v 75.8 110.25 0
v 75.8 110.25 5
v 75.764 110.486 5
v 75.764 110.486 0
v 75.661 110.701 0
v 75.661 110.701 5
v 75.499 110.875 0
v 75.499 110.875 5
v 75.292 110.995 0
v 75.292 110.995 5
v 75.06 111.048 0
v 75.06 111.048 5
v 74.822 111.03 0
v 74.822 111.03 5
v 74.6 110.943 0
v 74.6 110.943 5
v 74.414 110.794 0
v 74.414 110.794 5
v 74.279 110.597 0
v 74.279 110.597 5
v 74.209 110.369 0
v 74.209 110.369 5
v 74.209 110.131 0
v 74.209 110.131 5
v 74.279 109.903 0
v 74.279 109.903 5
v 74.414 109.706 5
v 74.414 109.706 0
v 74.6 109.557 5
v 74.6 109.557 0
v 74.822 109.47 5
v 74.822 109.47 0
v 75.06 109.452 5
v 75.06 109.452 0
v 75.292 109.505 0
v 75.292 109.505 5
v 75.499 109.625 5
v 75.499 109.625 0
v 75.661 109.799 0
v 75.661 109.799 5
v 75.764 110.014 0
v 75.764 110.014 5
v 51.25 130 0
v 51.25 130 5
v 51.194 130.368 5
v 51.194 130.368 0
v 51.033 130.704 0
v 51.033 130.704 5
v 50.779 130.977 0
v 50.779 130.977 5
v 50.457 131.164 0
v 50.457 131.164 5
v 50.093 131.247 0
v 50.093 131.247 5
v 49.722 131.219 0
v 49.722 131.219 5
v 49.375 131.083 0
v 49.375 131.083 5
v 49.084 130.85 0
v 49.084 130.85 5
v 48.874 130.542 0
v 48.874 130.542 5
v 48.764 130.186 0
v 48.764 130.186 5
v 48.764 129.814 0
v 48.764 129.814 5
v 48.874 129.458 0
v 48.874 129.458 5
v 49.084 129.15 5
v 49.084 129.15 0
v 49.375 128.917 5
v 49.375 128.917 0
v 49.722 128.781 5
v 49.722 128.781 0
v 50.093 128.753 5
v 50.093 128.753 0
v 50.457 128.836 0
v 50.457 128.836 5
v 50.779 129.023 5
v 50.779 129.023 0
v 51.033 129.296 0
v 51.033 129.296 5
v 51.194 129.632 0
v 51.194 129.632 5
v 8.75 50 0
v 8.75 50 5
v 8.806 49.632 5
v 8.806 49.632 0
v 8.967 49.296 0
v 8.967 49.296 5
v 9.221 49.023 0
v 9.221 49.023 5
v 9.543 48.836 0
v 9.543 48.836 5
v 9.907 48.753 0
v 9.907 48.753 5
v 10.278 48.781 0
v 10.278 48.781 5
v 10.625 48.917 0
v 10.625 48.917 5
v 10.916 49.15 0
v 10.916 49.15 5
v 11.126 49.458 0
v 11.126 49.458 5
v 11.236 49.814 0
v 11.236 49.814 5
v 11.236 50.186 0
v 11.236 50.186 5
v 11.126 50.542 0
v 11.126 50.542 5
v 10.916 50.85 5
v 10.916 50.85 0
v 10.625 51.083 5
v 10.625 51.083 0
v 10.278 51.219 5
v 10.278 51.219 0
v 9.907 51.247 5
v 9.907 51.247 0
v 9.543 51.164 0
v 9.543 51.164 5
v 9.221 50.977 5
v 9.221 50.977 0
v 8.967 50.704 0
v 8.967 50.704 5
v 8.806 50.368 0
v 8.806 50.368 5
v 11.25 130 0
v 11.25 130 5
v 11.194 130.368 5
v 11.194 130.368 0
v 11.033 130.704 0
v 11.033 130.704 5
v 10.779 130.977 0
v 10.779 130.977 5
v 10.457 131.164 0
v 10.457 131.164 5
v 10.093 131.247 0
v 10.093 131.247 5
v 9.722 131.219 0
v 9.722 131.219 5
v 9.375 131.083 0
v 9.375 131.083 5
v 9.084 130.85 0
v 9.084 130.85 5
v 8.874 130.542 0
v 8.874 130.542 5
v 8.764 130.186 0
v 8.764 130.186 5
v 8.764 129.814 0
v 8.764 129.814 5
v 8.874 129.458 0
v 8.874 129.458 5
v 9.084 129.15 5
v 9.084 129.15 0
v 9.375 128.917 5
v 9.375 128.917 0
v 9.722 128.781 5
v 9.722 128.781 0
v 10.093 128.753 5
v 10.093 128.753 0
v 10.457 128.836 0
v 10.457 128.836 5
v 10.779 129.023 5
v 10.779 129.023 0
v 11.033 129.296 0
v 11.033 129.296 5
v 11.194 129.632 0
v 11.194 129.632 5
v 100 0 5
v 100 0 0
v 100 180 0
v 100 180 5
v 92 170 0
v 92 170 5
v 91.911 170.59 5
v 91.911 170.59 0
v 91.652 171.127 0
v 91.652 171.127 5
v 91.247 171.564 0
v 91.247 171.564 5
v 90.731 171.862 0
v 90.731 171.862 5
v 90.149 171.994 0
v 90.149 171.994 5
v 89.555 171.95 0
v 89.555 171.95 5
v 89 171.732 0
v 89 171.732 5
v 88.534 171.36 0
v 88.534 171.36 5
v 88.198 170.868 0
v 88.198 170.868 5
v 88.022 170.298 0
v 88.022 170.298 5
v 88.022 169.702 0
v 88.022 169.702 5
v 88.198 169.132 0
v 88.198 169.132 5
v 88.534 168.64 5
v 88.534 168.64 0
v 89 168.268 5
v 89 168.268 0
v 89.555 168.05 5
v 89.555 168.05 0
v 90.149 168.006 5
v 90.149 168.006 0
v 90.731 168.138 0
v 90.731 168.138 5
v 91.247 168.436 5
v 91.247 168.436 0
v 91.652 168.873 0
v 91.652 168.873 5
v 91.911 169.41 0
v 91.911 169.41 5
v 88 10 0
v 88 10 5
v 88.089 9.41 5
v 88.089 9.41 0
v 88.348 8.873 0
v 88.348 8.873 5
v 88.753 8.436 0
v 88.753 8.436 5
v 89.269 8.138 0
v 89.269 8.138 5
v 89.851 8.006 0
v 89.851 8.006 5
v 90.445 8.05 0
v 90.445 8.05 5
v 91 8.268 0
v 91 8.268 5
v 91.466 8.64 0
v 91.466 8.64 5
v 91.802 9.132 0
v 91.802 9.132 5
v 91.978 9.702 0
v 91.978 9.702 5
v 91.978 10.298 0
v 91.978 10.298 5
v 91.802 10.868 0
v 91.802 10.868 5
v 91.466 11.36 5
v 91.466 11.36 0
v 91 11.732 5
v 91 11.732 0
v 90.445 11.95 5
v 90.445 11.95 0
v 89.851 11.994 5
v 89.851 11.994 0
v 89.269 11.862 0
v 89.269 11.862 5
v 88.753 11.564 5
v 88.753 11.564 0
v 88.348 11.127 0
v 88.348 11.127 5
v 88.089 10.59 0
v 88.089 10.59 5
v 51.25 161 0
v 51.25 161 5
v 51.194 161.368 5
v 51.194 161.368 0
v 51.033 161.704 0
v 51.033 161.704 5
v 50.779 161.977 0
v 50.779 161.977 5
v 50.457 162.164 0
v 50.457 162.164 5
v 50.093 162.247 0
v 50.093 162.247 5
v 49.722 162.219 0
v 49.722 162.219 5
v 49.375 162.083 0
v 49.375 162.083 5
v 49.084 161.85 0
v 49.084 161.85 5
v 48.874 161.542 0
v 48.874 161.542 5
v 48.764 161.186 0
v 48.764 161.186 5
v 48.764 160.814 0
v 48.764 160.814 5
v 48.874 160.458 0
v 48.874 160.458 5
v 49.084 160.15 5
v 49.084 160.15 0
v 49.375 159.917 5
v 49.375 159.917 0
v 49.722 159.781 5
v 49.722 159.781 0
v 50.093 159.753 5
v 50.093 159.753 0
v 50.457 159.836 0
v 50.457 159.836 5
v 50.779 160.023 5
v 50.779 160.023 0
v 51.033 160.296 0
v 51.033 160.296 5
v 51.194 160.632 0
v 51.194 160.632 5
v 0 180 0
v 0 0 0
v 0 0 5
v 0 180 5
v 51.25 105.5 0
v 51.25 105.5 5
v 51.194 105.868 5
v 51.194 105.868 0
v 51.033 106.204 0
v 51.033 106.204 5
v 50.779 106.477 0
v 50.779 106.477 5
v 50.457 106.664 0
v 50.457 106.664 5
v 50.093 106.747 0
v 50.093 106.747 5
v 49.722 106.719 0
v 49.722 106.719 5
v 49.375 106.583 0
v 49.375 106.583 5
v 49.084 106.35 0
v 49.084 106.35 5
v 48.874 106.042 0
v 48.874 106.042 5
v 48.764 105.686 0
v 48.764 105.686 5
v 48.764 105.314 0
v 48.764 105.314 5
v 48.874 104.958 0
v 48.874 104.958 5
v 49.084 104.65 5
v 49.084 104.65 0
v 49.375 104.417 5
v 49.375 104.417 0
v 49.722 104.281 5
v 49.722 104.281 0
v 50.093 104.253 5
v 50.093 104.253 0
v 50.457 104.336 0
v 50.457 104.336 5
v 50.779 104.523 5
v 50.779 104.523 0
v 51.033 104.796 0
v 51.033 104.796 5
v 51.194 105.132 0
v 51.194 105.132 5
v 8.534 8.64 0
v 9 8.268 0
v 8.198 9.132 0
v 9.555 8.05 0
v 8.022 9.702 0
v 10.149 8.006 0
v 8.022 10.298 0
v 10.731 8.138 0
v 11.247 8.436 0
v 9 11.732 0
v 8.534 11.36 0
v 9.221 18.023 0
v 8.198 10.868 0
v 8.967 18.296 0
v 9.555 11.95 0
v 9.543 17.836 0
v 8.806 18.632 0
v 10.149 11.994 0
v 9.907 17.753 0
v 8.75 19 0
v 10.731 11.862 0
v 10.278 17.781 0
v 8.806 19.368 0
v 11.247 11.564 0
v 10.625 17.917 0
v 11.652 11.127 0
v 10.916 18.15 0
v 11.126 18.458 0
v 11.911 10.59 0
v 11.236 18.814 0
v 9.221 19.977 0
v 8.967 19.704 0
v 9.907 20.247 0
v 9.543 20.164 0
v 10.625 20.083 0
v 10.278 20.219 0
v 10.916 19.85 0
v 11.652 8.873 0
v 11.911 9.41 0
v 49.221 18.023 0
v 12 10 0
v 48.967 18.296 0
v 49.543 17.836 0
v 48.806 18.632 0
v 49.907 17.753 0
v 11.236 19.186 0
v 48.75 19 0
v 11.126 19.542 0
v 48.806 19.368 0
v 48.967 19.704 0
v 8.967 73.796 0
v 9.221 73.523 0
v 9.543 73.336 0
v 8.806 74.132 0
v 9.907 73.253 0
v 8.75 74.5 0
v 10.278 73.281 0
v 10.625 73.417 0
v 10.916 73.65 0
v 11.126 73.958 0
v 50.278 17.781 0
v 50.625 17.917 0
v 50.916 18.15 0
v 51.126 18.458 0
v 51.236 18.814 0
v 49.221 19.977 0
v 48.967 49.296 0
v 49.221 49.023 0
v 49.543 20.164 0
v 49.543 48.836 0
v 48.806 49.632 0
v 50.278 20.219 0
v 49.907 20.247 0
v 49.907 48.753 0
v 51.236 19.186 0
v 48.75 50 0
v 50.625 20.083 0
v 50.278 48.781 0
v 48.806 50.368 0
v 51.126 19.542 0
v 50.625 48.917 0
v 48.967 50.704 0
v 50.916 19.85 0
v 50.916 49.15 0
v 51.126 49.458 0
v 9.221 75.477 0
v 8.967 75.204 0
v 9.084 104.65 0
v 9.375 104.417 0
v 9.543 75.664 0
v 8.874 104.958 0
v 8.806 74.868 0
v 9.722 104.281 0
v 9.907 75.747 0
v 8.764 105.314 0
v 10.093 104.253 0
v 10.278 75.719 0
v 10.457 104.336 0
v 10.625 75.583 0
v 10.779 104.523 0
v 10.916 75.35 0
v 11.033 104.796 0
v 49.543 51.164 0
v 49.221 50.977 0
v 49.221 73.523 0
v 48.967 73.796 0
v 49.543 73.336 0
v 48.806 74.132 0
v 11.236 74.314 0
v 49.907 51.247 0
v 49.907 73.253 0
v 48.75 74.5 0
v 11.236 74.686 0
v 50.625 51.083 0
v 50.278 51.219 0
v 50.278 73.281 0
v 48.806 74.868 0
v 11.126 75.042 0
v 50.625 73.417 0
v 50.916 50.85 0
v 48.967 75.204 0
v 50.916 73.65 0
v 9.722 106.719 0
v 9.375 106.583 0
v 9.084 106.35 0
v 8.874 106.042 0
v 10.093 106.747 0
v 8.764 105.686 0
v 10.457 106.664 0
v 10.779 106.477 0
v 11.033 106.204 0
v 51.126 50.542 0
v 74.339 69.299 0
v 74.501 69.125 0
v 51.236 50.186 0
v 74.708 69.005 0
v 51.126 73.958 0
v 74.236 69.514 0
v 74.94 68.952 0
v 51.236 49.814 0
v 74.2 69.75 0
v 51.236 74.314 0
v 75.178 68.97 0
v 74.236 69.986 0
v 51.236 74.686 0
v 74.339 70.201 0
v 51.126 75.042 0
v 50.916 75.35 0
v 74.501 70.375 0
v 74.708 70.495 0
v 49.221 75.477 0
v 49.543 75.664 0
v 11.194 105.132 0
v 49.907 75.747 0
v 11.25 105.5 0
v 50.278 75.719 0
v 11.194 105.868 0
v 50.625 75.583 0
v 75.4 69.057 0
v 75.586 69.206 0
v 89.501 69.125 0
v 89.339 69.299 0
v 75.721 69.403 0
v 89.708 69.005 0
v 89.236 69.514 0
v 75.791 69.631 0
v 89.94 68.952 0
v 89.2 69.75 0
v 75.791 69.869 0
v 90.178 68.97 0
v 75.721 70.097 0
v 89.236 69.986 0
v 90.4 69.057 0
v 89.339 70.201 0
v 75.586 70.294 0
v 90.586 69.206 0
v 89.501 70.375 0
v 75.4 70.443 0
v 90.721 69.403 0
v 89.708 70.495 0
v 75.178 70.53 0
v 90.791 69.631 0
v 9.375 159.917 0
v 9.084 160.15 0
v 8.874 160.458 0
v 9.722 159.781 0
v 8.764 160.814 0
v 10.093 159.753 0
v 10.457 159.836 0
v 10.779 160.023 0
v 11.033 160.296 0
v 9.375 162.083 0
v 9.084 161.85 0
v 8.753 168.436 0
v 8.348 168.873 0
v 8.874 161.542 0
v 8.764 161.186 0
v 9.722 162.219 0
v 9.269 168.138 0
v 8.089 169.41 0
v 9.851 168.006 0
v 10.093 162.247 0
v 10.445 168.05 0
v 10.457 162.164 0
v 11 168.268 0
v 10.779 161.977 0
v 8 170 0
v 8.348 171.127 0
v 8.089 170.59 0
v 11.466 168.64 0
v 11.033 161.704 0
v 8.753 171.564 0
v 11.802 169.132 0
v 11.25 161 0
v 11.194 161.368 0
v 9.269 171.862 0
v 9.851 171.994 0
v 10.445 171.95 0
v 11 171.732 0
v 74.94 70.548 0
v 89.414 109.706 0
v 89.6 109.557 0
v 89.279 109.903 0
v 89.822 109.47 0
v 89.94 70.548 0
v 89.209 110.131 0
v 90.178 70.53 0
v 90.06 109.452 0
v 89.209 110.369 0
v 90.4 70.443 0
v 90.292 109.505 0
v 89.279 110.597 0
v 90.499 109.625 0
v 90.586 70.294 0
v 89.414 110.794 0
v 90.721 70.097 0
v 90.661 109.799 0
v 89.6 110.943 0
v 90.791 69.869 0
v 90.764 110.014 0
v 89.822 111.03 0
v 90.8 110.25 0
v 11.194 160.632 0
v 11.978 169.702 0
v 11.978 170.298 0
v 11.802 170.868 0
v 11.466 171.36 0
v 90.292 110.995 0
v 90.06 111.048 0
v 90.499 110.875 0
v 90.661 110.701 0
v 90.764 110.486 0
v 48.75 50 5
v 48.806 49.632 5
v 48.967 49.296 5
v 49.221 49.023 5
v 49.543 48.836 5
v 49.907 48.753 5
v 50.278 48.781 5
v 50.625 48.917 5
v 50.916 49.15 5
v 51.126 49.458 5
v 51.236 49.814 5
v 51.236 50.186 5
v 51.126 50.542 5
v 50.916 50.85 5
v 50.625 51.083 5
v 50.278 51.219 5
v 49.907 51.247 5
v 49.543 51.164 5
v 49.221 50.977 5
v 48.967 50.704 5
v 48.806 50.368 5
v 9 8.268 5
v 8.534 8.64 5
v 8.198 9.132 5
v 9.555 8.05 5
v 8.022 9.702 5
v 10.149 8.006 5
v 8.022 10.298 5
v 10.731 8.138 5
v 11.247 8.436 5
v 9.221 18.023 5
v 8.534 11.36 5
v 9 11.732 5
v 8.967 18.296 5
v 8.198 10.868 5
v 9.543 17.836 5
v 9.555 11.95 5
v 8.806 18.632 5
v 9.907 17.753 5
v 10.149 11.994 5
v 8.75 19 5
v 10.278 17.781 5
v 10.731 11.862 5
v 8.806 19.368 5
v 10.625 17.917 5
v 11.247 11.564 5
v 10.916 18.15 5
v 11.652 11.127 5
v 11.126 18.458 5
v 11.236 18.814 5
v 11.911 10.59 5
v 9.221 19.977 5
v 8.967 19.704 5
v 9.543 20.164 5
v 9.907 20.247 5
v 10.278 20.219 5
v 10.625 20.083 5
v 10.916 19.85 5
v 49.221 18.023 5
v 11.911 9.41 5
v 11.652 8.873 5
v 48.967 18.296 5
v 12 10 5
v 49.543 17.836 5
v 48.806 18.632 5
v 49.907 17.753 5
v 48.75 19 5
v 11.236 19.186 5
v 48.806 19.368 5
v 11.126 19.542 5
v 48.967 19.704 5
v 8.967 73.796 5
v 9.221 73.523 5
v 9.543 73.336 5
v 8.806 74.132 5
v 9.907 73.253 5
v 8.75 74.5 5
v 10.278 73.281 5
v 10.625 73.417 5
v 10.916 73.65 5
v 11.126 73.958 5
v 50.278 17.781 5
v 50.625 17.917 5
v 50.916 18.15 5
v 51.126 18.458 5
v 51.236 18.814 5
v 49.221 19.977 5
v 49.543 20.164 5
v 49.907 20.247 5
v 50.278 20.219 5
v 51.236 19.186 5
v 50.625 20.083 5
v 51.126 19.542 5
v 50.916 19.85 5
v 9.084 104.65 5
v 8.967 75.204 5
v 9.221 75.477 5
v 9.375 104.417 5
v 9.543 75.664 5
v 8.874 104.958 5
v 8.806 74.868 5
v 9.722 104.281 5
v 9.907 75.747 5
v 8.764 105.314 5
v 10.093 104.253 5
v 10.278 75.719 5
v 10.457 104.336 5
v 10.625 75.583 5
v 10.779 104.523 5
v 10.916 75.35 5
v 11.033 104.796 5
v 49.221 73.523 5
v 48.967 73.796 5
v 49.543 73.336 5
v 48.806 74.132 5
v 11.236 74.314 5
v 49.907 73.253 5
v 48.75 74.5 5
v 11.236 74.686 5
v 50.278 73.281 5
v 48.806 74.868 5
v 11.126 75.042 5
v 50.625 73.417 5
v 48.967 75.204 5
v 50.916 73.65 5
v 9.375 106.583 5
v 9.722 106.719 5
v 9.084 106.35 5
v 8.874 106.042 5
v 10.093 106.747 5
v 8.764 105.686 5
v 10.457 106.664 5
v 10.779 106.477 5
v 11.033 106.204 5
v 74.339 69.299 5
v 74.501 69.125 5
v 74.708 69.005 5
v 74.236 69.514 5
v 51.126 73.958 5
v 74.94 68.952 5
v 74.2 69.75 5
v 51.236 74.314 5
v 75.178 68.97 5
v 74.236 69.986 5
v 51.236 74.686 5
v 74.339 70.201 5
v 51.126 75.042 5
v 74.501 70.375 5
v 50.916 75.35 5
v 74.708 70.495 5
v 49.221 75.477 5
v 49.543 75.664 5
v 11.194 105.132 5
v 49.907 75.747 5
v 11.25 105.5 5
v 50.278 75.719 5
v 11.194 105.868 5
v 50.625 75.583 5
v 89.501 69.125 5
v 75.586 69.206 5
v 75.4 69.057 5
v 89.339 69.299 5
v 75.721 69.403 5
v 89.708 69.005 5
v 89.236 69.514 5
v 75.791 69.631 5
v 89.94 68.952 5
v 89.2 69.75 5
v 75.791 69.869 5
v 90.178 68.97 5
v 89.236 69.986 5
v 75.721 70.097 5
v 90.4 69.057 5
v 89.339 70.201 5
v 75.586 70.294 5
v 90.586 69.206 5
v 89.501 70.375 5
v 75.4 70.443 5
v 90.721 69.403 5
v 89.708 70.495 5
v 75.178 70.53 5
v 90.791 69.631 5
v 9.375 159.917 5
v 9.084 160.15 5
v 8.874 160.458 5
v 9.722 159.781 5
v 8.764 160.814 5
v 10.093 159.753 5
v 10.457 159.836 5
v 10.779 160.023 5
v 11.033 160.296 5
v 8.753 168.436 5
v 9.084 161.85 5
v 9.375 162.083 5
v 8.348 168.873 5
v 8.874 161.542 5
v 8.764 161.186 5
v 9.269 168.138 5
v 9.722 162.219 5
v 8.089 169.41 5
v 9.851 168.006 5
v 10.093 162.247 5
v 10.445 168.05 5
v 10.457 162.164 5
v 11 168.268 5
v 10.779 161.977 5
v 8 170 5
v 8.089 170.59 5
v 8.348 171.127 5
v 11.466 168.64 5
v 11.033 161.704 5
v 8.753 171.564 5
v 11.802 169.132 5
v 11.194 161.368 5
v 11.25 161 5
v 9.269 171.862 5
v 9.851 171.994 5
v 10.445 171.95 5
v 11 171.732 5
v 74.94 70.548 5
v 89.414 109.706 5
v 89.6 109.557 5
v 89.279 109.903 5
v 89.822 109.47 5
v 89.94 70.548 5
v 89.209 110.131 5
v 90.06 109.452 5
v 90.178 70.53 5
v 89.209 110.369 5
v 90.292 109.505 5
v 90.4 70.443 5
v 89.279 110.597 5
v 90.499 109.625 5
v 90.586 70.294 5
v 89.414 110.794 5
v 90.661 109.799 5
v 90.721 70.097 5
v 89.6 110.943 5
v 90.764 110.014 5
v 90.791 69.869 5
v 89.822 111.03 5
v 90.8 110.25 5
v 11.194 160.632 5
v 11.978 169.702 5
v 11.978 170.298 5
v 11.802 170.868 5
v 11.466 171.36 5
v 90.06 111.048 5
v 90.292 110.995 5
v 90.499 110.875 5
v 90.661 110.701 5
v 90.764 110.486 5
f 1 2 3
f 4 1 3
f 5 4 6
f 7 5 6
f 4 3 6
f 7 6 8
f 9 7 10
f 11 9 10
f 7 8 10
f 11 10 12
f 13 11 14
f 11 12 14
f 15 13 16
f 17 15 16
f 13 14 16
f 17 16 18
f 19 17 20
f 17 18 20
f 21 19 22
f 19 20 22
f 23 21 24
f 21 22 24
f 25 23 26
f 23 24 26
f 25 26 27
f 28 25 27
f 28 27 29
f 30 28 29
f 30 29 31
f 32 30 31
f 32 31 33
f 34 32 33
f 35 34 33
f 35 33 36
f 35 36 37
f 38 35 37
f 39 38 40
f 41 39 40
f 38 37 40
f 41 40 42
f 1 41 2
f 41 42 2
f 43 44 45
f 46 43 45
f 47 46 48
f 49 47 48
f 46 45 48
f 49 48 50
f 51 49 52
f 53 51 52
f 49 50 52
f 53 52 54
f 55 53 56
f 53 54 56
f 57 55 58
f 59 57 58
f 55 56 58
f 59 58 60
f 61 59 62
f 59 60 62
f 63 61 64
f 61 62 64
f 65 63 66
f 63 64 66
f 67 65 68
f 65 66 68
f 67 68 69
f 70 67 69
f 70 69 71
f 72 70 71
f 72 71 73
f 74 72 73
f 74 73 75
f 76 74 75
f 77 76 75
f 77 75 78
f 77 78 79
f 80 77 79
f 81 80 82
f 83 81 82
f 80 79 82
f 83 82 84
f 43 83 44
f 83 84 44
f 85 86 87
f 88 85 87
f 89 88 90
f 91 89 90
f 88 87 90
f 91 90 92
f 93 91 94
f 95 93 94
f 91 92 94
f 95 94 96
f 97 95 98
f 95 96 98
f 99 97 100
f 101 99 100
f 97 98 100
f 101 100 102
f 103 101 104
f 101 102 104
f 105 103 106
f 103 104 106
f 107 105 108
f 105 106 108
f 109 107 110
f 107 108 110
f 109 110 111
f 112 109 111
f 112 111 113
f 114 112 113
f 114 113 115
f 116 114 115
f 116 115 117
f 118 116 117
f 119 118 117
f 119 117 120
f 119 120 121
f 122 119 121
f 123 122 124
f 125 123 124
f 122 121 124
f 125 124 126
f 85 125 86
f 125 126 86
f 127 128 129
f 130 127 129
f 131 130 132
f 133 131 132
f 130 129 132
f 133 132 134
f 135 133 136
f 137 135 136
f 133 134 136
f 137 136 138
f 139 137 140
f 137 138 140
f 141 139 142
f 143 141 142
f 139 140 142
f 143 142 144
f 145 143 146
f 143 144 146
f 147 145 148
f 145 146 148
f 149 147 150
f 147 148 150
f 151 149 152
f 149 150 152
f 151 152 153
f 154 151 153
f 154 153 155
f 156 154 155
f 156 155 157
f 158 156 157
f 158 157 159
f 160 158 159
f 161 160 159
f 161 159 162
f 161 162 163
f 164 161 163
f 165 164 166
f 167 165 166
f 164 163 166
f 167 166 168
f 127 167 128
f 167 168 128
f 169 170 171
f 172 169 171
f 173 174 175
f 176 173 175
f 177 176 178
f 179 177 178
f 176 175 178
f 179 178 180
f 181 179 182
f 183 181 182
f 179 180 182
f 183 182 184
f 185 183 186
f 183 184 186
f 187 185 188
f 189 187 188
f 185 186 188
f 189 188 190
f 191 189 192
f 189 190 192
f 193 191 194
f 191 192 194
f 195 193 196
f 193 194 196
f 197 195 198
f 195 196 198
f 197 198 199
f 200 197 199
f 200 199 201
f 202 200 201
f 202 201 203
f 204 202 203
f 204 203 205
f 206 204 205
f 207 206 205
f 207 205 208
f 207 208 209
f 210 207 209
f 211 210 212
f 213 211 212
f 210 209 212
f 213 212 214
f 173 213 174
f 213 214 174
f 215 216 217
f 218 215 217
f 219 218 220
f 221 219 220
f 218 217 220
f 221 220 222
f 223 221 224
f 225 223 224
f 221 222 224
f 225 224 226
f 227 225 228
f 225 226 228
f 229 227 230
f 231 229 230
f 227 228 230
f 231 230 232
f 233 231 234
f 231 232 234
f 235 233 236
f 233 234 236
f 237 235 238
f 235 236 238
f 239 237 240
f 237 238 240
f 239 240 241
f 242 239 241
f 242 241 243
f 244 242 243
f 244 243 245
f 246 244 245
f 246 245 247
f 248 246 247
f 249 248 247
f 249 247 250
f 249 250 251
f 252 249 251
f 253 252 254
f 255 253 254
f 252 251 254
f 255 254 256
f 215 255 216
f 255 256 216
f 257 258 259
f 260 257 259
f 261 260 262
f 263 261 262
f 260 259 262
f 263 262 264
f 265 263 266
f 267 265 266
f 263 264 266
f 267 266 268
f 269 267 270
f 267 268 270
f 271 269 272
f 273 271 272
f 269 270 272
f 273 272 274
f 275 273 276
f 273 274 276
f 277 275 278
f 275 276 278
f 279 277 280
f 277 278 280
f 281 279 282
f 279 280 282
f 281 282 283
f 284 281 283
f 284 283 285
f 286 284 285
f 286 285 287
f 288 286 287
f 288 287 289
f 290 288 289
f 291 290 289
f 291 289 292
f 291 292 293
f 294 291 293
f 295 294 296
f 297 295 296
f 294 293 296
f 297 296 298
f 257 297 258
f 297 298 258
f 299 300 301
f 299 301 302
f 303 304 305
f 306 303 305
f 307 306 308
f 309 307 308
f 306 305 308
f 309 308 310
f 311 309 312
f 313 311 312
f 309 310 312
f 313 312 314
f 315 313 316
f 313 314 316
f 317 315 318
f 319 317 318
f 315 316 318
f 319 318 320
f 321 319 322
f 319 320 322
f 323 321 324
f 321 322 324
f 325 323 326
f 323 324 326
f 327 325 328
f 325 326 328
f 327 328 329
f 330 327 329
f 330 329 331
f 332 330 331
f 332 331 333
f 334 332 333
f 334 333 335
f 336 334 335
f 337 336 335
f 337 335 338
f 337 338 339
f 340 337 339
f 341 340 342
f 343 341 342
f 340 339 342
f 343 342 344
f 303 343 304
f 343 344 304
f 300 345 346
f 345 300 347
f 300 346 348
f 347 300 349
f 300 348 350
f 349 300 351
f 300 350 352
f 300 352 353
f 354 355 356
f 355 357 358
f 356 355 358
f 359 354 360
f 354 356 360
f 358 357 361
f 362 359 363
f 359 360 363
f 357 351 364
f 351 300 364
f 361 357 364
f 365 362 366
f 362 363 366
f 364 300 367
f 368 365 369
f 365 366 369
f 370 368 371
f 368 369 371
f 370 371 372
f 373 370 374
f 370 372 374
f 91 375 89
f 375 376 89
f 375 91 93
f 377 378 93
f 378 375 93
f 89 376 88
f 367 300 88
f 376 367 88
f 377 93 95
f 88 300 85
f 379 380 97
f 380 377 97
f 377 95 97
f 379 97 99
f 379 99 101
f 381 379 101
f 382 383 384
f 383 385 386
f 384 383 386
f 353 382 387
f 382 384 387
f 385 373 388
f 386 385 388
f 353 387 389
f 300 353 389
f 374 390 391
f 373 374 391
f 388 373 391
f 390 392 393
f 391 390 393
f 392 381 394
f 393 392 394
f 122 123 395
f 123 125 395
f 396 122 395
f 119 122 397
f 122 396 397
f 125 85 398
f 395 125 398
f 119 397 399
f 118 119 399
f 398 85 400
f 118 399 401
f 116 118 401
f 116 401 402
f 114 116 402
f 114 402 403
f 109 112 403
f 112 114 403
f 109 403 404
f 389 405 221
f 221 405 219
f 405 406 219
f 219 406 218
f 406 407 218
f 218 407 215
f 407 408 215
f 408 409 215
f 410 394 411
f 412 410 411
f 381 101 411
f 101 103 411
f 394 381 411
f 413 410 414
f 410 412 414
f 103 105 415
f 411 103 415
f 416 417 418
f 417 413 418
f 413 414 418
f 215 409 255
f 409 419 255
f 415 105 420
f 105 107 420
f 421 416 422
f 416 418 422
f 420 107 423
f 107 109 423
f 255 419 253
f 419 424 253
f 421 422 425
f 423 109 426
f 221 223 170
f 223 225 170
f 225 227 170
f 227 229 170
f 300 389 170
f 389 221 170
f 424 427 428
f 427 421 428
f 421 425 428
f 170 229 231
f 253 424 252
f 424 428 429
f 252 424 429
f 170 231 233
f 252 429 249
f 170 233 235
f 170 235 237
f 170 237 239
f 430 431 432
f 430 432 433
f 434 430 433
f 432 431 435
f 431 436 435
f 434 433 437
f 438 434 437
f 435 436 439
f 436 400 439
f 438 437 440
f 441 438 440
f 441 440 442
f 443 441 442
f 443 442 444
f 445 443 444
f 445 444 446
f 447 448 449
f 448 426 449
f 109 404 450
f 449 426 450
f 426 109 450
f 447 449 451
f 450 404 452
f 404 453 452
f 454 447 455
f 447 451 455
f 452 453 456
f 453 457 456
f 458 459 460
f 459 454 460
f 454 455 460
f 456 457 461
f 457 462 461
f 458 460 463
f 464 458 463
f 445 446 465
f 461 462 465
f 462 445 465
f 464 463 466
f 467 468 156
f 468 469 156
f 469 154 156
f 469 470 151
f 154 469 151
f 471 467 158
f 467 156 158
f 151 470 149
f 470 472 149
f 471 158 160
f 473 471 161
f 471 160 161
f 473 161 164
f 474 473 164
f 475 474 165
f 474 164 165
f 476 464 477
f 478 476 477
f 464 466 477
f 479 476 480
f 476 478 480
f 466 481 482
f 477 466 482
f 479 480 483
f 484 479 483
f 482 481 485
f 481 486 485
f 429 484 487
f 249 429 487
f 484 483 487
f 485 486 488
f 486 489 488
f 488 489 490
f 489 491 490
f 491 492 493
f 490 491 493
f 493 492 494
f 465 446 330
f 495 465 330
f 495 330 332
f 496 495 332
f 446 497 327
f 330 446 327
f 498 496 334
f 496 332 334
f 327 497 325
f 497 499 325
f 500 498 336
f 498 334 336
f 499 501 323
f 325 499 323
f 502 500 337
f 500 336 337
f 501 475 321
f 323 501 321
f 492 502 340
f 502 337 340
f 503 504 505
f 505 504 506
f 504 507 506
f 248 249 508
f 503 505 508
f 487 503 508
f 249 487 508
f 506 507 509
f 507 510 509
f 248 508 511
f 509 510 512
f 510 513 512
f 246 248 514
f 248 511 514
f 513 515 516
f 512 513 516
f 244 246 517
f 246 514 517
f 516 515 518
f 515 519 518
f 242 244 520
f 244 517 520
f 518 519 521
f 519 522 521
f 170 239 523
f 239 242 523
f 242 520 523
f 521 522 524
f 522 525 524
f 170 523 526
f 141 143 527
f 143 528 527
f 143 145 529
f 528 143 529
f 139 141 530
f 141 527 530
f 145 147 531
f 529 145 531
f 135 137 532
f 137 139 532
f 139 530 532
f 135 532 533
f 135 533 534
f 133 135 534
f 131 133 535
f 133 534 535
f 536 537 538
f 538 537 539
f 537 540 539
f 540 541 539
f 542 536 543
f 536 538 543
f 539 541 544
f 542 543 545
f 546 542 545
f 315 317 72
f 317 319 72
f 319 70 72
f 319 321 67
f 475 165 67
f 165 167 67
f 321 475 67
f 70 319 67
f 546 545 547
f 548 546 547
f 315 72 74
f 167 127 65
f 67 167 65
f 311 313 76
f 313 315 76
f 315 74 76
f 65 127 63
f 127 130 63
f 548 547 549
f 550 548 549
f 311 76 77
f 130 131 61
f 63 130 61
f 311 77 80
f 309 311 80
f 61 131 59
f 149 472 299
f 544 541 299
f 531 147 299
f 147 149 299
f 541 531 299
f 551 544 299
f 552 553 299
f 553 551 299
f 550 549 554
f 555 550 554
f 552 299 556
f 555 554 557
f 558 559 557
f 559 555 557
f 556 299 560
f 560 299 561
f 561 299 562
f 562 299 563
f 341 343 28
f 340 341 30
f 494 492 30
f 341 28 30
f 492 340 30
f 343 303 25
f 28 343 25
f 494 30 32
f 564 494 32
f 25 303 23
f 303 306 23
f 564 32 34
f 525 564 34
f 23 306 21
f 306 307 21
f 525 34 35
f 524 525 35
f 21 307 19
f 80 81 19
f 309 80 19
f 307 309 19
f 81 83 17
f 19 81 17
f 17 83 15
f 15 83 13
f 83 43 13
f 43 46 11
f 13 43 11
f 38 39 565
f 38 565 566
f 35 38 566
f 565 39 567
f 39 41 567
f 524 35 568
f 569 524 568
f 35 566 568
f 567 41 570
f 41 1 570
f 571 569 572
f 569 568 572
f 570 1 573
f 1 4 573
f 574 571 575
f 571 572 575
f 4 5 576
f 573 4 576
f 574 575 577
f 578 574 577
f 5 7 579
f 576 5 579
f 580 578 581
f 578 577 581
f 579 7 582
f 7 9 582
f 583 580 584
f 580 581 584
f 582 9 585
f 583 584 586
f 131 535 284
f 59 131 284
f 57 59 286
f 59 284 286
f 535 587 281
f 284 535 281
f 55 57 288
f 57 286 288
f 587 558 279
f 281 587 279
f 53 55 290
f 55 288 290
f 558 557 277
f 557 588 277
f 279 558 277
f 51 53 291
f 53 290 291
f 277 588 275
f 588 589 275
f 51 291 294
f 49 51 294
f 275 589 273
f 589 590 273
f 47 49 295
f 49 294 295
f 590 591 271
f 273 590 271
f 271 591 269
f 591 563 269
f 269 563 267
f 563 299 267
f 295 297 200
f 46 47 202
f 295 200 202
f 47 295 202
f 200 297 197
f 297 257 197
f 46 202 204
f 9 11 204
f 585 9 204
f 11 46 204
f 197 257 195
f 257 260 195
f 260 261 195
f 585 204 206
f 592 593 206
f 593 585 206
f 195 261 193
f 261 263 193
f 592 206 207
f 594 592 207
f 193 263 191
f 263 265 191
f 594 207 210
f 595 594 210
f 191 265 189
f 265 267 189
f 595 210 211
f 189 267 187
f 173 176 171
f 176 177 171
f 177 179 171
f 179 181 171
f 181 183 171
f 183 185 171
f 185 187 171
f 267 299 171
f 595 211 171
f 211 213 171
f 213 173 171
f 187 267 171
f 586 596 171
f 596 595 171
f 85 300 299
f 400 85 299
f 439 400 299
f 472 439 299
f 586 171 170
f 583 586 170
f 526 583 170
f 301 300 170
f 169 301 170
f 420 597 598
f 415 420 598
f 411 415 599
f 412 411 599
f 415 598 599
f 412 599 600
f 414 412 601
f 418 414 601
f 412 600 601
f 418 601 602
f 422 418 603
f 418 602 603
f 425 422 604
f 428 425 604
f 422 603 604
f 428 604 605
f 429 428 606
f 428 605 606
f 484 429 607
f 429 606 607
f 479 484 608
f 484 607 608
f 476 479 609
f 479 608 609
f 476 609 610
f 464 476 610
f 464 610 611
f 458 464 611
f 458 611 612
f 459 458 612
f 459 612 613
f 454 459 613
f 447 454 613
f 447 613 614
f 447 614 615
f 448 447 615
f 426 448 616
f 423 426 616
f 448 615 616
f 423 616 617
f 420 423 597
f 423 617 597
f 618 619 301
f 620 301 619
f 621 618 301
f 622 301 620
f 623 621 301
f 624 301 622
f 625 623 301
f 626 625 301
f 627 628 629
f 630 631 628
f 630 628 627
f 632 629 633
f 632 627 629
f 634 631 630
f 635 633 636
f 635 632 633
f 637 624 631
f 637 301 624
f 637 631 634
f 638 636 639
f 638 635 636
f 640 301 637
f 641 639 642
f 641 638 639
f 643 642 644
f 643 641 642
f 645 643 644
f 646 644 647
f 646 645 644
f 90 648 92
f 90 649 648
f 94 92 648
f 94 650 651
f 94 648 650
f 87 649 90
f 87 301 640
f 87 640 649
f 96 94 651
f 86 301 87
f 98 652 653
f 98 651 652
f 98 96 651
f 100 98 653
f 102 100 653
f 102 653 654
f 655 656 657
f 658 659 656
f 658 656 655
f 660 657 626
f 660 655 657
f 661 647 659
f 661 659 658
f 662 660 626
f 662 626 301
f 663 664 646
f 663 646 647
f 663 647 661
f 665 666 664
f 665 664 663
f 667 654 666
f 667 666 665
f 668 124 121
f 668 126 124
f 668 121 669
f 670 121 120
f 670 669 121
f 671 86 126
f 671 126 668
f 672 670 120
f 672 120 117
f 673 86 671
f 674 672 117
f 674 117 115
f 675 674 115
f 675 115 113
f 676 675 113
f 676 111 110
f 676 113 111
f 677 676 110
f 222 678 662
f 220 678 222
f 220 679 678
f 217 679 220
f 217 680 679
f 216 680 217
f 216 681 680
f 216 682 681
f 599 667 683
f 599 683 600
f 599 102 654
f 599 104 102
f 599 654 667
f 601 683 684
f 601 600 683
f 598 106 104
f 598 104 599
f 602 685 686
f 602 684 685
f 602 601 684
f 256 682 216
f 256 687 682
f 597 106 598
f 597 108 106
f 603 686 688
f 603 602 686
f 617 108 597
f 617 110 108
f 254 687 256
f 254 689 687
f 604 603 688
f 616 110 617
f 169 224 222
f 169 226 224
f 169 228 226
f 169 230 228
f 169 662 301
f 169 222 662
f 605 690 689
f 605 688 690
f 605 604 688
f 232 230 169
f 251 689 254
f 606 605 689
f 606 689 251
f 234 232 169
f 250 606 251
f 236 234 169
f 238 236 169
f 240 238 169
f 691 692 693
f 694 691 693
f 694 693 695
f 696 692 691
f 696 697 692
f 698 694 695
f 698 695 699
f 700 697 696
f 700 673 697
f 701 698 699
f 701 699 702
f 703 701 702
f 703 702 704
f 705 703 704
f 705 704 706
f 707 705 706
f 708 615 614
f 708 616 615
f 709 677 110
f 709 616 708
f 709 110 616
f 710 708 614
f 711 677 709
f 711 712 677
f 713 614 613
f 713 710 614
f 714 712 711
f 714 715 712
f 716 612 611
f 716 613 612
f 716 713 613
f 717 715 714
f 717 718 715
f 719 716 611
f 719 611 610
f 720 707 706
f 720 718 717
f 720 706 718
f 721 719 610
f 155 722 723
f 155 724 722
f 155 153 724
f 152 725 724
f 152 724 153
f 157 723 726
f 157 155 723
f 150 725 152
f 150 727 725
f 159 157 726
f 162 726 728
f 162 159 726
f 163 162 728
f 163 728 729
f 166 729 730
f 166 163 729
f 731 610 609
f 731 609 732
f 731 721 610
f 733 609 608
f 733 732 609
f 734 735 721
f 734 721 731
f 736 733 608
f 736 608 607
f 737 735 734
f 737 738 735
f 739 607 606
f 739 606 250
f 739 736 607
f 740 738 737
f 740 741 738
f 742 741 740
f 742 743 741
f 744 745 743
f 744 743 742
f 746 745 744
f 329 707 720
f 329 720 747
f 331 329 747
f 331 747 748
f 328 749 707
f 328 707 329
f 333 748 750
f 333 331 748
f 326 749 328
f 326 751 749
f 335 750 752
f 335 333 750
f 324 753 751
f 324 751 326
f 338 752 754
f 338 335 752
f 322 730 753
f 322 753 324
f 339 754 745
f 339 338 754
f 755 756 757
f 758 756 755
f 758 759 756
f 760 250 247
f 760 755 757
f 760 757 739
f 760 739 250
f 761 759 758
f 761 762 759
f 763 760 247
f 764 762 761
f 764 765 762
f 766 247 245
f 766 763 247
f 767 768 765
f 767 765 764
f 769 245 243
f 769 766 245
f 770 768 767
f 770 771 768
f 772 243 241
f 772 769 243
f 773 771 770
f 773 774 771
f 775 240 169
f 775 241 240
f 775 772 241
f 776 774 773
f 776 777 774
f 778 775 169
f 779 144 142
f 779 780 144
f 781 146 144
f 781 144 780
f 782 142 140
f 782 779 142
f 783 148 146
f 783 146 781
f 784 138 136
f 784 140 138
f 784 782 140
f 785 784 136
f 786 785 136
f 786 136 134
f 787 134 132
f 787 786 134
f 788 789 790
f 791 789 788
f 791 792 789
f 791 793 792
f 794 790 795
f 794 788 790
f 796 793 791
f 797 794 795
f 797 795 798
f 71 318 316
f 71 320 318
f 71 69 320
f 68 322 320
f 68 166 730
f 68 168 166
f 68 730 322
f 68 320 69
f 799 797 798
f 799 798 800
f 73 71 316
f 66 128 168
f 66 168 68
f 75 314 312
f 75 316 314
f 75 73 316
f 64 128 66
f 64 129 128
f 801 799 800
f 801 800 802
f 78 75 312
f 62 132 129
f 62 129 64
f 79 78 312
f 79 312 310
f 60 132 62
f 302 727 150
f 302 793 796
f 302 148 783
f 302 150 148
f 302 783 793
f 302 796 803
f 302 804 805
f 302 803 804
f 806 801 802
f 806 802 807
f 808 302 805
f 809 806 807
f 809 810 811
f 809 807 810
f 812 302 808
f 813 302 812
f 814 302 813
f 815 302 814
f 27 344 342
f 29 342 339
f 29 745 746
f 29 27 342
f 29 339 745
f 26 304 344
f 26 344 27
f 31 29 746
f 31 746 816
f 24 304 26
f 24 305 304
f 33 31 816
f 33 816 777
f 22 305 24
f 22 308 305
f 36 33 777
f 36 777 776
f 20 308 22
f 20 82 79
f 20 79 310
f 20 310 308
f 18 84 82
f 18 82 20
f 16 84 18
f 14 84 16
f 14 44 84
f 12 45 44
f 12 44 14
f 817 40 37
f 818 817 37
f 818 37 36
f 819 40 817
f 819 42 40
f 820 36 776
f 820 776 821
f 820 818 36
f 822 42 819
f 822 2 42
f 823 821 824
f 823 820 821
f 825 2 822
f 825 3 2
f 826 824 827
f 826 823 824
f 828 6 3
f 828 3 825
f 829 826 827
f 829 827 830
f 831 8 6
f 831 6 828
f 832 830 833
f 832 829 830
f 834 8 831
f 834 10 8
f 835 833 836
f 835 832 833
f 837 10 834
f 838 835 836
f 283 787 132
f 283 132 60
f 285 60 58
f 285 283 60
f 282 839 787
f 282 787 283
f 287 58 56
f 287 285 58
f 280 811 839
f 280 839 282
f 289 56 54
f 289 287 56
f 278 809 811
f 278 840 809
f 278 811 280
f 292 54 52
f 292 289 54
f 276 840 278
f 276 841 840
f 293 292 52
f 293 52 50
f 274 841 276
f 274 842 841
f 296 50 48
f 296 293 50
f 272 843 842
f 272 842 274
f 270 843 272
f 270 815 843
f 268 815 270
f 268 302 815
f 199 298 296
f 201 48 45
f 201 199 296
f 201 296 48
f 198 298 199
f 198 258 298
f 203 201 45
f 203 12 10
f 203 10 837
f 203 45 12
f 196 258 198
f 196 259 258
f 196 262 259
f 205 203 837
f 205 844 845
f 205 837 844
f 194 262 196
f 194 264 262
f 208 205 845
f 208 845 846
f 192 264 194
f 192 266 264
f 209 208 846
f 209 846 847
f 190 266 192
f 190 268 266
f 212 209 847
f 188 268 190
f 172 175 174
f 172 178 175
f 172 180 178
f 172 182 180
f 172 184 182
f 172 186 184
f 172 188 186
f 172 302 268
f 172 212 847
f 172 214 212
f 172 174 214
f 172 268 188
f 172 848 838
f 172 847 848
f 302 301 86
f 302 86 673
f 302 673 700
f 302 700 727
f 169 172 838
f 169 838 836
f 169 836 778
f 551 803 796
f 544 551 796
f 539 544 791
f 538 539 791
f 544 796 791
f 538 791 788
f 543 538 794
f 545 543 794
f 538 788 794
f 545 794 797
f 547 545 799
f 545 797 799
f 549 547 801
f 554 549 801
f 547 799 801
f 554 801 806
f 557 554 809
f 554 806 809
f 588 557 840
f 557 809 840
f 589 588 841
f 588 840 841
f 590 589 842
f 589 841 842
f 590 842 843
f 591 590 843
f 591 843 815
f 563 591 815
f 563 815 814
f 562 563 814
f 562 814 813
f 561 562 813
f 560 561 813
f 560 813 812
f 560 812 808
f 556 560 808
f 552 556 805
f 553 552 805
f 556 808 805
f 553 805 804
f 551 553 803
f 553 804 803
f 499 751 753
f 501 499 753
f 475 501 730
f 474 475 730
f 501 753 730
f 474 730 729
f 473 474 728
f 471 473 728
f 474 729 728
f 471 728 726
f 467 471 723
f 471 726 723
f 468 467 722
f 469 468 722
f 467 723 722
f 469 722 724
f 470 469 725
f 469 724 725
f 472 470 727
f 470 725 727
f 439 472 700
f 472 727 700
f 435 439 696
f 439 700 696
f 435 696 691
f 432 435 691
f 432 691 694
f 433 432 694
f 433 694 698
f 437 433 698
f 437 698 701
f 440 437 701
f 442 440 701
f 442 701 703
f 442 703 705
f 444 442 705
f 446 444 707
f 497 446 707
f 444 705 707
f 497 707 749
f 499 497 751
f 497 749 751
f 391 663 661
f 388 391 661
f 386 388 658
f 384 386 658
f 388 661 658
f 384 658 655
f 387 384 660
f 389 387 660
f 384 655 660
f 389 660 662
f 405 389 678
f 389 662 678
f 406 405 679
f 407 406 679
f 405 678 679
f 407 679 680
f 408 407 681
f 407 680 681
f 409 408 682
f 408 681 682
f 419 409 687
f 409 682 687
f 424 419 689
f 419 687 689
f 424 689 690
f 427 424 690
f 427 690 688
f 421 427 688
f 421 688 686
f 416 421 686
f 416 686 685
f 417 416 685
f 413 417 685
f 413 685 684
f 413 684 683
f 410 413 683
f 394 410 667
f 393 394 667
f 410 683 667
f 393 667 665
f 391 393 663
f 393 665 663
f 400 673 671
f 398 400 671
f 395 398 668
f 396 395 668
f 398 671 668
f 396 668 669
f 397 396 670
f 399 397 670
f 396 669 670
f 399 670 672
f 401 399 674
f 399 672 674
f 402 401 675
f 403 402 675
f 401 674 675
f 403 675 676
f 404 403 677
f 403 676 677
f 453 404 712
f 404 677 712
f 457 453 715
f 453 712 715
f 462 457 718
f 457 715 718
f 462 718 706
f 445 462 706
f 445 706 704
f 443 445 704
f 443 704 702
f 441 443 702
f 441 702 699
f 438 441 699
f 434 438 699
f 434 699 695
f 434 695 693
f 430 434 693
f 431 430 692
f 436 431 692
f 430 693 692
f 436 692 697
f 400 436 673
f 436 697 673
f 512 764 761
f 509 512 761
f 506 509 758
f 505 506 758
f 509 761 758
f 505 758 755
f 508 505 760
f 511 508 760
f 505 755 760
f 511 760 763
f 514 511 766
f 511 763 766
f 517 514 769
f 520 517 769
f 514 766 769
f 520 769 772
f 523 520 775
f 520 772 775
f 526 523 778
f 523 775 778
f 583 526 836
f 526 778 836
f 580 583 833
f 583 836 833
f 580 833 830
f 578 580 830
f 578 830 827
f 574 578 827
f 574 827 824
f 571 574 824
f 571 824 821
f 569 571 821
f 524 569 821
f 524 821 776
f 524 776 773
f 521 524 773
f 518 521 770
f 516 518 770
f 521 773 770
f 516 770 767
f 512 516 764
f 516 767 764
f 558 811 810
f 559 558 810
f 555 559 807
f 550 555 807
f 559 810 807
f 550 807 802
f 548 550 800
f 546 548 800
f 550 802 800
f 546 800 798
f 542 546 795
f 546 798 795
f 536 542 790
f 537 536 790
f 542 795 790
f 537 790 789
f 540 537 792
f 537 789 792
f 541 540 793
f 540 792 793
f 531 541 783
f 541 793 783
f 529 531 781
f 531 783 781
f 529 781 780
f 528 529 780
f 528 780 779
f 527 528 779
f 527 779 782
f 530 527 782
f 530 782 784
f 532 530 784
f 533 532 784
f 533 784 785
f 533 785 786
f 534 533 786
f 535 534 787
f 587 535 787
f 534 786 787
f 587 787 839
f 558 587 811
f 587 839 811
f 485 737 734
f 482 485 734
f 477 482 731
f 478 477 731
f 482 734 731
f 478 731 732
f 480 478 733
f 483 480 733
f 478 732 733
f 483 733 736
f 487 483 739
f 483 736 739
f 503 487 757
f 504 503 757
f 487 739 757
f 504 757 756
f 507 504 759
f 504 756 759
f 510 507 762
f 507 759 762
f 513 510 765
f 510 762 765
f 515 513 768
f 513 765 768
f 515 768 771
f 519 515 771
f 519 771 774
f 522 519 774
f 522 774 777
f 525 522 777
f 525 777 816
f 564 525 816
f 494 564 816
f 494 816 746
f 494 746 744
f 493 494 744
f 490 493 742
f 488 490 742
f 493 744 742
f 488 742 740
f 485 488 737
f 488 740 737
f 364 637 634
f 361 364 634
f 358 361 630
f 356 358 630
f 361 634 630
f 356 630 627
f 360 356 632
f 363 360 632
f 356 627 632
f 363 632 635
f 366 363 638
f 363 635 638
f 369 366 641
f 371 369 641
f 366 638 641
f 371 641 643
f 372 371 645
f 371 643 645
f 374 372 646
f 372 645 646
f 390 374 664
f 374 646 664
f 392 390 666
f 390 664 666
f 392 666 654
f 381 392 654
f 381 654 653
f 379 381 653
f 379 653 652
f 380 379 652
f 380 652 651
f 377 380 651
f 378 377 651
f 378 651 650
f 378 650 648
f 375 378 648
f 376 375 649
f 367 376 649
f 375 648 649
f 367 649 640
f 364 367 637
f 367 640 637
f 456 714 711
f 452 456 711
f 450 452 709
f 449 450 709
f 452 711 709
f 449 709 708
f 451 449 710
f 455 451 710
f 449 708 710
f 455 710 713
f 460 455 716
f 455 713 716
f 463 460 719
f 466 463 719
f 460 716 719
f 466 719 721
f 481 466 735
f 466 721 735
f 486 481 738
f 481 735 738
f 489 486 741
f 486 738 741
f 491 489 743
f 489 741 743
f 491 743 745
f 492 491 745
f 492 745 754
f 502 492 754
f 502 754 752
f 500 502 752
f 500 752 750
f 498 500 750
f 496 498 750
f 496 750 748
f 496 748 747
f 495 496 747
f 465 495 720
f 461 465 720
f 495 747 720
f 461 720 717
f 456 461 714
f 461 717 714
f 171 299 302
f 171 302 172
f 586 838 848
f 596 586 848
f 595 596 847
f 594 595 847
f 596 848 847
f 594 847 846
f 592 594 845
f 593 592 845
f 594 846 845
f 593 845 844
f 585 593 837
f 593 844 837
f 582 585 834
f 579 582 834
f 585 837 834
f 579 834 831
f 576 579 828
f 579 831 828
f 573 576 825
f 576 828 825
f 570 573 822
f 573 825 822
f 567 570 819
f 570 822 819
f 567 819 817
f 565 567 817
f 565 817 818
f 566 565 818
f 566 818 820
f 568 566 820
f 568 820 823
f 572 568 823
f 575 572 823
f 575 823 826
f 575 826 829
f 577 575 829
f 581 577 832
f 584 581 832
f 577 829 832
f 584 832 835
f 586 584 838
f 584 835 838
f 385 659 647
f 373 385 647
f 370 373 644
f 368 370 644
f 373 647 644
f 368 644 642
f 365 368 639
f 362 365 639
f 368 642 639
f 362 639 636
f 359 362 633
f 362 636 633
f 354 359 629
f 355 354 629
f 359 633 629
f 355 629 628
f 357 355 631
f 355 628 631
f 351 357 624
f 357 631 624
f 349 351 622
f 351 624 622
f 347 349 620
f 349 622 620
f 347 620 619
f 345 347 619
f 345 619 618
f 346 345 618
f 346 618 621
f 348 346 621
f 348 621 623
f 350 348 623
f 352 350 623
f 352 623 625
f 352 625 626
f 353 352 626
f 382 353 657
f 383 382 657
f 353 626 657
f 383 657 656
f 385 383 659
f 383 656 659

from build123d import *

# Parameters (mm, degrees)
ESQUISSE1_W             = 100
ESQUISSE1_H             = 180
BOSS_EXTRU_1_DEPTH      = 5
ESQUISSE2_R             = 1.25
ESQUISSE2_R_2           = 0.8
ESQUISSE2_R_3           = 2
ENL_V_MAT_EXTRU_1_DEPTH = 5


with BuildPart() as part:
    # Esquisse1 → Boss.-Extru.1 (new body)
    with BuildSketch(Plane.XY):
        with Locations((50, 90)):
            Rectangle(ESQUISSE1_W, ESQUISSE1_H)
    extrude(amount=BOSS_EXTRU_1_DEPTH)

    # Esquisse2 → Enlèv. mat.-Extru.1 (cut)
    with BuildSketch(Plane.XY.offset(5)):
        with Locations((10, 105.5)):
            Circle(ESQUISSE2_R)
        with Locations((50, 105.5)):
            Circle(ESQUISSE2_R)
        with Locations(Location((50, 74.5, 0), (0, 0, 180))):
            Circle(ESQUISSE2_R)
        with Locations(Location((10, 74.5, 0), (0, 0, 180))):
            Circle(ESQUISSE2_R)
        with Locations((10, 130)):
            Circle(ESQUISSE2_R)
        with Locations((50, 130)):
            Circle(ESQUISSE2_R)
        with Locations((50, 161)):
            Circle(ESQUISSE2_R)
        with Locations((10, 161)):
            Circle(ESQUISSE2_R)
        with Locations(Location((10, 19, 0), (0, 0, 180))):
            Circle(ESQUISSE2_R)
        with Locations(Location((50, 19, 0), (0, 0, 180))):
            Circle(ESQUISSE2_R)
        with Locations(Location((50, 50, 0), (0, 0, 180))):
            Circle(ESQUISSE2_R)
        with Locations(Location((10, 50, 0), (0, 0, 180))):
            Circle(ESQUISSE2_R)
        with Locations((75, 110.25)):
            Circle(ESQUISSE2_R_2)
        with Locations((90, 110.25)):
            Circle(ESQUISSE2_R_2)
        with Locations(Location((90, 69.75, 0), (0, 0, 180))):
            Circle(ESQUISSE2_R_2)
        with Locations(Location((75, 69.75, 0), (0, 0, 180))):
            Circle(ESQUISSE2_R_2)
        with Locations((90, 170)):
            Circle(ESQUISSE2_R_3)
        with Locations(Location((90, 10, 0), (0, 0, 180))):
            Circle(ESQUISSE2_R_3)
        with Locations(Location((10, 170, 0), (0, 0, 180))):
            Circle(ESQUISSE2_R_3)
        with Locations((10, 10)):
            Circle(ESQUISSE2_R_3)
    extrude(amount=-ENL_V_MAT_EXTRU_1_DEPTH, mode=Mode.SUBTRACT)


solid = part.part
